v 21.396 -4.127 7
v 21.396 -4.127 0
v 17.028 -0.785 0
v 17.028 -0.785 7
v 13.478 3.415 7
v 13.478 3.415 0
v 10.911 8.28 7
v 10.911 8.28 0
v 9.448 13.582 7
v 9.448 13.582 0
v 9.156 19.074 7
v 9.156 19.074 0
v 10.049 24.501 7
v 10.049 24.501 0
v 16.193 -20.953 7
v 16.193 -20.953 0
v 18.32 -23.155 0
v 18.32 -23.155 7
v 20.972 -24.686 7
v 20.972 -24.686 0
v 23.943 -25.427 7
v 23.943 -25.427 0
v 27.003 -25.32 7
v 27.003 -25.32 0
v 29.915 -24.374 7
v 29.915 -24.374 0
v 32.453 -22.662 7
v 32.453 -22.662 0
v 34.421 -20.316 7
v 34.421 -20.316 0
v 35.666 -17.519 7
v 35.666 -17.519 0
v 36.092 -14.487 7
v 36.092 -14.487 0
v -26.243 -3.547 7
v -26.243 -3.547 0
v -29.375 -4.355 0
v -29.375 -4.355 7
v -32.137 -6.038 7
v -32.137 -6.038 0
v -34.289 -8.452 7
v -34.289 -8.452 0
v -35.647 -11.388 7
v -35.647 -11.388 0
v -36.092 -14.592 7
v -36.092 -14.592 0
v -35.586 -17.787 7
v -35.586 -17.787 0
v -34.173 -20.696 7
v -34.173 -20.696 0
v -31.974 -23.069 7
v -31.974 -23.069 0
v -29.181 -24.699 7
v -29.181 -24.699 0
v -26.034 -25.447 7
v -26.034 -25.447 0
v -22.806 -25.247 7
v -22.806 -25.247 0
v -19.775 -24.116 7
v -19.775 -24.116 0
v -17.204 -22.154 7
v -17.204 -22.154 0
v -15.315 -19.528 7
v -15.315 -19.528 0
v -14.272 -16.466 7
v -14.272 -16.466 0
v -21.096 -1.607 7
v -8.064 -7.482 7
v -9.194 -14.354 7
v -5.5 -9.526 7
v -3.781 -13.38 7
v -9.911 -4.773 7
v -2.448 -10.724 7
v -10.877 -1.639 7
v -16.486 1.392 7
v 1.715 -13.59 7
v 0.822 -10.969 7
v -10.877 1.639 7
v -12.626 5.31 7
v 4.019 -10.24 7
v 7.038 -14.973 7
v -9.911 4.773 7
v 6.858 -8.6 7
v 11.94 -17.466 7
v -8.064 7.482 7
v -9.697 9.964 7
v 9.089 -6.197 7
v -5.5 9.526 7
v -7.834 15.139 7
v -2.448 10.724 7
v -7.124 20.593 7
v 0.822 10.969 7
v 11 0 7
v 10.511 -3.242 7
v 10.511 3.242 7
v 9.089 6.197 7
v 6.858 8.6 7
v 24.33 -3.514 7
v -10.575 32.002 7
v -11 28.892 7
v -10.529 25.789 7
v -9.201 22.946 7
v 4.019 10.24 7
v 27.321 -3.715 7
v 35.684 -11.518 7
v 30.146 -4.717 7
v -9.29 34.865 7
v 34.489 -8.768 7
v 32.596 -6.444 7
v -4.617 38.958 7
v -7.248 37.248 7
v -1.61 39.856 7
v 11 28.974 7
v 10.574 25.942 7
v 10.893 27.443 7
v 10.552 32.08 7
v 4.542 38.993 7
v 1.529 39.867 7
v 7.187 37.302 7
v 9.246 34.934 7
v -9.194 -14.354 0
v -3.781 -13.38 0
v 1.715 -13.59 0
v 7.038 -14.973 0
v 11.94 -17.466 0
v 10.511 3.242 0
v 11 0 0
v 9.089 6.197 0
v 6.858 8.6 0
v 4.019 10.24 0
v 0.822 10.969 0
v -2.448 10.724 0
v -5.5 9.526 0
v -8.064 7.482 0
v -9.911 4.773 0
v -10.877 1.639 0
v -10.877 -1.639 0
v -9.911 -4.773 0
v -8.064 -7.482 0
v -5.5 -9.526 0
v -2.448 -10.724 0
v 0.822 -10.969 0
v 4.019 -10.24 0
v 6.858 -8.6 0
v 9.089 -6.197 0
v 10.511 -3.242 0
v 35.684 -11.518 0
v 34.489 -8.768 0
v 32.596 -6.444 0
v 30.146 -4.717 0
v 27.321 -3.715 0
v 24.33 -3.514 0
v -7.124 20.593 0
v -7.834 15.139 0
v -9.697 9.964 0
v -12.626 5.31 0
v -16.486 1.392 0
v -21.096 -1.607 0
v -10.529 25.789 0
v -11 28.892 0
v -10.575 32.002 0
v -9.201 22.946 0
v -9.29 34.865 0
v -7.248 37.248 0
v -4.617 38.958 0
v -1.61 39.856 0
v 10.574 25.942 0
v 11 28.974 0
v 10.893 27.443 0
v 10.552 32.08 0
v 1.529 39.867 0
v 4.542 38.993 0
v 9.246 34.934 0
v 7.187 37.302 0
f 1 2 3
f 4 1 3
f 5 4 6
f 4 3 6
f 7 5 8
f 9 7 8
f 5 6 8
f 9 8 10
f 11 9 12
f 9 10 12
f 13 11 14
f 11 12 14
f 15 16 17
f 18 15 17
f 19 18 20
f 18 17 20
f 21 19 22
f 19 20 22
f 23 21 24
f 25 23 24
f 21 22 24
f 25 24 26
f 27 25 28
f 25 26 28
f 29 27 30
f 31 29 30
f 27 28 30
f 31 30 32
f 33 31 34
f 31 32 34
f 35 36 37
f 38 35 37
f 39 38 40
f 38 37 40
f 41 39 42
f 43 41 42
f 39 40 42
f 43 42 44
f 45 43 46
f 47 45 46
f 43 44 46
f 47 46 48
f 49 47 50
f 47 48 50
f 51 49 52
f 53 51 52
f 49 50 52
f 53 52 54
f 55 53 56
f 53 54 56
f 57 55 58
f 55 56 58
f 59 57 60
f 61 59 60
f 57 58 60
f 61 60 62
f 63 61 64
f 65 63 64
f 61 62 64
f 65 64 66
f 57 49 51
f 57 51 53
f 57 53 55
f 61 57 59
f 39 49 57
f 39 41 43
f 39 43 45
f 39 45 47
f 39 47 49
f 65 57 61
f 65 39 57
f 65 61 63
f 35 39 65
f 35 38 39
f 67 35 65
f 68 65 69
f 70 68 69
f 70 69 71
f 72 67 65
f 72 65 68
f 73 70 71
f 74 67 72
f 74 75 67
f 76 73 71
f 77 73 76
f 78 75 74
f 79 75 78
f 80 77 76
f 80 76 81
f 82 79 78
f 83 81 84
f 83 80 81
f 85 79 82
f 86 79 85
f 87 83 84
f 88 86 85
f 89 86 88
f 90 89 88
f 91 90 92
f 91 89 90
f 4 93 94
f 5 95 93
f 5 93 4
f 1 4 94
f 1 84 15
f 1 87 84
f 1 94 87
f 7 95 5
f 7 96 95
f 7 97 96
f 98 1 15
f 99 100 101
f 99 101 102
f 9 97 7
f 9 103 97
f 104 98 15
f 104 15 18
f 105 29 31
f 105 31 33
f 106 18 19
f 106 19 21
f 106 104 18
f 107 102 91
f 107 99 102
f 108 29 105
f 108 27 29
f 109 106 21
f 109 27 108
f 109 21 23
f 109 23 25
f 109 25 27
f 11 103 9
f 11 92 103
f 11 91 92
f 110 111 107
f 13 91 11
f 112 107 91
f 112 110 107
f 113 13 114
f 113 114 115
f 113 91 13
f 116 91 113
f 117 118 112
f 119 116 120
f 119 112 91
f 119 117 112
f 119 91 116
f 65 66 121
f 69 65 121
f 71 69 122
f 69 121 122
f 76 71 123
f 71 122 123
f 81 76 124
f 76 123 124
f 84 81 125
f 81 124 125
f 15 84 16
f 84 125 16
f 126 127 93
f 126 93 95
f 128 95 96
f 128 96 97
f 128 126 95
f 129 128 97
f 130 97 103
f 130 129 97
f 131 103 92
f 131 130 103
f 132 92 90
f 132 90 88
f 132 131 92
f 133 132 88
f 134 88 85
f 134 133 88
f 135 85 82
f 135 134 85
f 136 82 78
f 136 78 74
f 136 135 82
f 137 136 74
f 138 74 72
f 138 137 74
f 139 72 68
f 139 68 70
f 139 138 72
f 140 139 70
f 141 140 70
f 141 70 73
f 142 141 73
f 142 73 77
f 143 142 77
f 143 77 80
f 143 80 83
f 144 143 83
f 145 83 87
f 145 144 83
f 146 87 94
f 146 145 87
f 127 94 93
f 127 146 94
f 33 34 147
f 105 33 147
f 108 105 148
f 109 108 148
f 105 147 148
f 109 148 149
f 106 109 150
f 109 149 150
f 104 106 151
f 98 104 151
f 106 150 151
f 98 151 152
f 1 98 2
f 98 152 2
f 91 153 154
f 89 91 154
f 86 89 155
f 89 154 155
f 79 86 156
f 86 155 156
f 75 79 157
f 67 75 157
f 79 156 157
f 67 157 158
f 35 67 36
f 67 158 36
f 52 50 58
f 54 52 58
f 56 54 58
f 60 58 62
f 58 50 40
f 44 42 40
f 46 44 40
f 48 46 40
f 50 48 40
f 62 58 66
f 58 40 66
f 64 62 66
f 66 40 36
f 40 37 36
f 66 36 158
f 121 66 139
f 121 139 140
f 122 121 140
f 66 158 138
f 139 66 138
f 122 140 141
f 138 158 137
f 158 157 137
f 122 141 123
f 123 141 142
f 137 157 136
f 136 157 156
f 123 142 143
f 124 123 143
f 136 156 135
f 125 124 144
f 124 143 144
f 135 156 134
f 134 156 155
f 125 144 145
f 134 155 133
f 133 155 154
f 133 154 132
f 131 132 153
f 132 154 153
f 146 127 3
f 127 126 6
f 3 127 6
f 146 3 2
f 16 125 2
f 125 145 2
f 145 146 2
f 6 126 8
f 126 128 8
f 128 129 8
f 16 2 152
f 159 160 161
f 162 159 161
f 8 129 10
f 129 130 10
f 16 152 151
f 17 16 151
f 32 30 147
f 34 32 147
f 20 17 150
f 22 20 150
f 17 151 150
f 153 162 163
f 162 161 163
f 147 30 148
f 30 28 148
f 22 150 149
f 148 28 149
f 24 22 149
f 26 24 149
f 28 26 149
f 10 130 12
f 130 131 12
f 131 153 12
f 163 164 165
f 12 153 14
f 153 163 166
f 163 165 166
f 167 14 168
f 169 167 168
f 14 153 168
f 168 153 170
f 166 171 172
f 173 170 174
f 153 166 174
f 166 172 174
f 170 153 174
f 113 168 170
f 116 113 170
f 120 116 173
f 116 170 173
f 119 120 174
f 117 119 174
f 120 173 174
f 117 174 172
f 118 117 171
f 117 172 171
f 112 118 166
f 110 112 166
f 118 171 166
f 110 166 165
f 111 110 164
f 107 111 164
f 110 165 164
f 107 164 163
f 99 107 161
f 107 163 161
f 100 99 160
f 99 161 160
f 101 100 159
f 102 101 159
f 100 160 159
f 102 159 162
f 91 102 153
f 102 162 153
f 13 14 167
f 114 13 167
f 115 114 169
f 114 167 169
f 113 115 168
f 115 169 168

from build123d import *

# Parameters (mm, degrees)
F0_R     = 11
F1_DEPTH = 7


# Not quite as in the source:
# - a feature of the source that left no trace in its solid (it failed there, or was rolled back) is left out


with BuildPart() as f1:
    # F0 (on Top) → F1 (new body)
    with BuildSketch(Plane.XY):
        with BuildLine():
            ThreePointArc((10.0491768514, 24.5005127008), (2.4404784534, 18.2483589799), (-7.1242678109, 20.5930010332))
            ThreePointArc((-7.1242678109, 20.5930010332), (-12.6262898219, 5.3096518199), (-26.2426548303, -3.54741391))
            ThreePointArc((-26.2426548303, -3.54741391), (-17.732134245, -6.3123707797), (-14.0924093757, -14.4871093077))
            ThreePointArc((-14.0924093757, -14.4871093077), (-14.1373809935, -15.4807657603), (-14.2719281295, -16.4662974242))
            ThreePointArc((-14.2719281295, -16.4662974242), (1.7148515496, -13.5895136513), (16.1934779789, -20.9530987908))
            ThreePointArc((16.1934779789, -20.9530987908), (14.5833032273, -11.237695828), (21.3961959404, -4.126703609))
            ThreePointArc((21.3961959404, -4.126703609), (10.9114382722, 8.2798618313), (10.0491768514, 24.5005127008))
        make_face()
        Circle(F0_R, mode=Mode.SUBTRACT)
        with BuildLine():
            ThreePointArc((10.0491768514, 24.5005127008), (10.7596687999, 26.6874026373), (11, 28.9742186153))
            ThreePointArc((11, 28.9742186153), (-4.6169824604, 38.9583797198), (-7.1242678109, 20.5930010332))
            ThreePointArc((-7.1242678109, 20.5930010332), (2.4404784534, 18.2483589799), (10.0491768514, 24.5005127008))
        make_face()
        with BuildLine():
            ThreePointArc((-14.0924093757, -14.4871093077), (-17.732134245, -6.3123707797), (-26.2426548303, -3.54741391))
            ThreePointArc((-26.2426548303, -3.54741391), (-33.1610370706, -21.9635554634), (-14.2719281295, -16.4662974242))
            ThreePointArc((-14.2719281295, -16.4662974242), (-14.1373809935, -15.4807657603), (-14.0924093757, -14.4871093077))
        make_face()
        with BuildLine():
            ThreePointArc((36.0924093757, -14.4871093077), (31.4304552974, -5.4966046559), (21.3961959404, -4.126703609))
            ThreePointArc((21.3961959404, -4.126703609), (14.5833032273, -11.237695828), (16.1934779789, -20.9530987908))
            ThreePointArc((16.1934779789, -20.9530987908), (28.4918030448, -24.9486638137), (36.0924093757, -14.4871093077))
        make_face()
    extrude(amount=F1_DEPTH)


solid = f1.part
